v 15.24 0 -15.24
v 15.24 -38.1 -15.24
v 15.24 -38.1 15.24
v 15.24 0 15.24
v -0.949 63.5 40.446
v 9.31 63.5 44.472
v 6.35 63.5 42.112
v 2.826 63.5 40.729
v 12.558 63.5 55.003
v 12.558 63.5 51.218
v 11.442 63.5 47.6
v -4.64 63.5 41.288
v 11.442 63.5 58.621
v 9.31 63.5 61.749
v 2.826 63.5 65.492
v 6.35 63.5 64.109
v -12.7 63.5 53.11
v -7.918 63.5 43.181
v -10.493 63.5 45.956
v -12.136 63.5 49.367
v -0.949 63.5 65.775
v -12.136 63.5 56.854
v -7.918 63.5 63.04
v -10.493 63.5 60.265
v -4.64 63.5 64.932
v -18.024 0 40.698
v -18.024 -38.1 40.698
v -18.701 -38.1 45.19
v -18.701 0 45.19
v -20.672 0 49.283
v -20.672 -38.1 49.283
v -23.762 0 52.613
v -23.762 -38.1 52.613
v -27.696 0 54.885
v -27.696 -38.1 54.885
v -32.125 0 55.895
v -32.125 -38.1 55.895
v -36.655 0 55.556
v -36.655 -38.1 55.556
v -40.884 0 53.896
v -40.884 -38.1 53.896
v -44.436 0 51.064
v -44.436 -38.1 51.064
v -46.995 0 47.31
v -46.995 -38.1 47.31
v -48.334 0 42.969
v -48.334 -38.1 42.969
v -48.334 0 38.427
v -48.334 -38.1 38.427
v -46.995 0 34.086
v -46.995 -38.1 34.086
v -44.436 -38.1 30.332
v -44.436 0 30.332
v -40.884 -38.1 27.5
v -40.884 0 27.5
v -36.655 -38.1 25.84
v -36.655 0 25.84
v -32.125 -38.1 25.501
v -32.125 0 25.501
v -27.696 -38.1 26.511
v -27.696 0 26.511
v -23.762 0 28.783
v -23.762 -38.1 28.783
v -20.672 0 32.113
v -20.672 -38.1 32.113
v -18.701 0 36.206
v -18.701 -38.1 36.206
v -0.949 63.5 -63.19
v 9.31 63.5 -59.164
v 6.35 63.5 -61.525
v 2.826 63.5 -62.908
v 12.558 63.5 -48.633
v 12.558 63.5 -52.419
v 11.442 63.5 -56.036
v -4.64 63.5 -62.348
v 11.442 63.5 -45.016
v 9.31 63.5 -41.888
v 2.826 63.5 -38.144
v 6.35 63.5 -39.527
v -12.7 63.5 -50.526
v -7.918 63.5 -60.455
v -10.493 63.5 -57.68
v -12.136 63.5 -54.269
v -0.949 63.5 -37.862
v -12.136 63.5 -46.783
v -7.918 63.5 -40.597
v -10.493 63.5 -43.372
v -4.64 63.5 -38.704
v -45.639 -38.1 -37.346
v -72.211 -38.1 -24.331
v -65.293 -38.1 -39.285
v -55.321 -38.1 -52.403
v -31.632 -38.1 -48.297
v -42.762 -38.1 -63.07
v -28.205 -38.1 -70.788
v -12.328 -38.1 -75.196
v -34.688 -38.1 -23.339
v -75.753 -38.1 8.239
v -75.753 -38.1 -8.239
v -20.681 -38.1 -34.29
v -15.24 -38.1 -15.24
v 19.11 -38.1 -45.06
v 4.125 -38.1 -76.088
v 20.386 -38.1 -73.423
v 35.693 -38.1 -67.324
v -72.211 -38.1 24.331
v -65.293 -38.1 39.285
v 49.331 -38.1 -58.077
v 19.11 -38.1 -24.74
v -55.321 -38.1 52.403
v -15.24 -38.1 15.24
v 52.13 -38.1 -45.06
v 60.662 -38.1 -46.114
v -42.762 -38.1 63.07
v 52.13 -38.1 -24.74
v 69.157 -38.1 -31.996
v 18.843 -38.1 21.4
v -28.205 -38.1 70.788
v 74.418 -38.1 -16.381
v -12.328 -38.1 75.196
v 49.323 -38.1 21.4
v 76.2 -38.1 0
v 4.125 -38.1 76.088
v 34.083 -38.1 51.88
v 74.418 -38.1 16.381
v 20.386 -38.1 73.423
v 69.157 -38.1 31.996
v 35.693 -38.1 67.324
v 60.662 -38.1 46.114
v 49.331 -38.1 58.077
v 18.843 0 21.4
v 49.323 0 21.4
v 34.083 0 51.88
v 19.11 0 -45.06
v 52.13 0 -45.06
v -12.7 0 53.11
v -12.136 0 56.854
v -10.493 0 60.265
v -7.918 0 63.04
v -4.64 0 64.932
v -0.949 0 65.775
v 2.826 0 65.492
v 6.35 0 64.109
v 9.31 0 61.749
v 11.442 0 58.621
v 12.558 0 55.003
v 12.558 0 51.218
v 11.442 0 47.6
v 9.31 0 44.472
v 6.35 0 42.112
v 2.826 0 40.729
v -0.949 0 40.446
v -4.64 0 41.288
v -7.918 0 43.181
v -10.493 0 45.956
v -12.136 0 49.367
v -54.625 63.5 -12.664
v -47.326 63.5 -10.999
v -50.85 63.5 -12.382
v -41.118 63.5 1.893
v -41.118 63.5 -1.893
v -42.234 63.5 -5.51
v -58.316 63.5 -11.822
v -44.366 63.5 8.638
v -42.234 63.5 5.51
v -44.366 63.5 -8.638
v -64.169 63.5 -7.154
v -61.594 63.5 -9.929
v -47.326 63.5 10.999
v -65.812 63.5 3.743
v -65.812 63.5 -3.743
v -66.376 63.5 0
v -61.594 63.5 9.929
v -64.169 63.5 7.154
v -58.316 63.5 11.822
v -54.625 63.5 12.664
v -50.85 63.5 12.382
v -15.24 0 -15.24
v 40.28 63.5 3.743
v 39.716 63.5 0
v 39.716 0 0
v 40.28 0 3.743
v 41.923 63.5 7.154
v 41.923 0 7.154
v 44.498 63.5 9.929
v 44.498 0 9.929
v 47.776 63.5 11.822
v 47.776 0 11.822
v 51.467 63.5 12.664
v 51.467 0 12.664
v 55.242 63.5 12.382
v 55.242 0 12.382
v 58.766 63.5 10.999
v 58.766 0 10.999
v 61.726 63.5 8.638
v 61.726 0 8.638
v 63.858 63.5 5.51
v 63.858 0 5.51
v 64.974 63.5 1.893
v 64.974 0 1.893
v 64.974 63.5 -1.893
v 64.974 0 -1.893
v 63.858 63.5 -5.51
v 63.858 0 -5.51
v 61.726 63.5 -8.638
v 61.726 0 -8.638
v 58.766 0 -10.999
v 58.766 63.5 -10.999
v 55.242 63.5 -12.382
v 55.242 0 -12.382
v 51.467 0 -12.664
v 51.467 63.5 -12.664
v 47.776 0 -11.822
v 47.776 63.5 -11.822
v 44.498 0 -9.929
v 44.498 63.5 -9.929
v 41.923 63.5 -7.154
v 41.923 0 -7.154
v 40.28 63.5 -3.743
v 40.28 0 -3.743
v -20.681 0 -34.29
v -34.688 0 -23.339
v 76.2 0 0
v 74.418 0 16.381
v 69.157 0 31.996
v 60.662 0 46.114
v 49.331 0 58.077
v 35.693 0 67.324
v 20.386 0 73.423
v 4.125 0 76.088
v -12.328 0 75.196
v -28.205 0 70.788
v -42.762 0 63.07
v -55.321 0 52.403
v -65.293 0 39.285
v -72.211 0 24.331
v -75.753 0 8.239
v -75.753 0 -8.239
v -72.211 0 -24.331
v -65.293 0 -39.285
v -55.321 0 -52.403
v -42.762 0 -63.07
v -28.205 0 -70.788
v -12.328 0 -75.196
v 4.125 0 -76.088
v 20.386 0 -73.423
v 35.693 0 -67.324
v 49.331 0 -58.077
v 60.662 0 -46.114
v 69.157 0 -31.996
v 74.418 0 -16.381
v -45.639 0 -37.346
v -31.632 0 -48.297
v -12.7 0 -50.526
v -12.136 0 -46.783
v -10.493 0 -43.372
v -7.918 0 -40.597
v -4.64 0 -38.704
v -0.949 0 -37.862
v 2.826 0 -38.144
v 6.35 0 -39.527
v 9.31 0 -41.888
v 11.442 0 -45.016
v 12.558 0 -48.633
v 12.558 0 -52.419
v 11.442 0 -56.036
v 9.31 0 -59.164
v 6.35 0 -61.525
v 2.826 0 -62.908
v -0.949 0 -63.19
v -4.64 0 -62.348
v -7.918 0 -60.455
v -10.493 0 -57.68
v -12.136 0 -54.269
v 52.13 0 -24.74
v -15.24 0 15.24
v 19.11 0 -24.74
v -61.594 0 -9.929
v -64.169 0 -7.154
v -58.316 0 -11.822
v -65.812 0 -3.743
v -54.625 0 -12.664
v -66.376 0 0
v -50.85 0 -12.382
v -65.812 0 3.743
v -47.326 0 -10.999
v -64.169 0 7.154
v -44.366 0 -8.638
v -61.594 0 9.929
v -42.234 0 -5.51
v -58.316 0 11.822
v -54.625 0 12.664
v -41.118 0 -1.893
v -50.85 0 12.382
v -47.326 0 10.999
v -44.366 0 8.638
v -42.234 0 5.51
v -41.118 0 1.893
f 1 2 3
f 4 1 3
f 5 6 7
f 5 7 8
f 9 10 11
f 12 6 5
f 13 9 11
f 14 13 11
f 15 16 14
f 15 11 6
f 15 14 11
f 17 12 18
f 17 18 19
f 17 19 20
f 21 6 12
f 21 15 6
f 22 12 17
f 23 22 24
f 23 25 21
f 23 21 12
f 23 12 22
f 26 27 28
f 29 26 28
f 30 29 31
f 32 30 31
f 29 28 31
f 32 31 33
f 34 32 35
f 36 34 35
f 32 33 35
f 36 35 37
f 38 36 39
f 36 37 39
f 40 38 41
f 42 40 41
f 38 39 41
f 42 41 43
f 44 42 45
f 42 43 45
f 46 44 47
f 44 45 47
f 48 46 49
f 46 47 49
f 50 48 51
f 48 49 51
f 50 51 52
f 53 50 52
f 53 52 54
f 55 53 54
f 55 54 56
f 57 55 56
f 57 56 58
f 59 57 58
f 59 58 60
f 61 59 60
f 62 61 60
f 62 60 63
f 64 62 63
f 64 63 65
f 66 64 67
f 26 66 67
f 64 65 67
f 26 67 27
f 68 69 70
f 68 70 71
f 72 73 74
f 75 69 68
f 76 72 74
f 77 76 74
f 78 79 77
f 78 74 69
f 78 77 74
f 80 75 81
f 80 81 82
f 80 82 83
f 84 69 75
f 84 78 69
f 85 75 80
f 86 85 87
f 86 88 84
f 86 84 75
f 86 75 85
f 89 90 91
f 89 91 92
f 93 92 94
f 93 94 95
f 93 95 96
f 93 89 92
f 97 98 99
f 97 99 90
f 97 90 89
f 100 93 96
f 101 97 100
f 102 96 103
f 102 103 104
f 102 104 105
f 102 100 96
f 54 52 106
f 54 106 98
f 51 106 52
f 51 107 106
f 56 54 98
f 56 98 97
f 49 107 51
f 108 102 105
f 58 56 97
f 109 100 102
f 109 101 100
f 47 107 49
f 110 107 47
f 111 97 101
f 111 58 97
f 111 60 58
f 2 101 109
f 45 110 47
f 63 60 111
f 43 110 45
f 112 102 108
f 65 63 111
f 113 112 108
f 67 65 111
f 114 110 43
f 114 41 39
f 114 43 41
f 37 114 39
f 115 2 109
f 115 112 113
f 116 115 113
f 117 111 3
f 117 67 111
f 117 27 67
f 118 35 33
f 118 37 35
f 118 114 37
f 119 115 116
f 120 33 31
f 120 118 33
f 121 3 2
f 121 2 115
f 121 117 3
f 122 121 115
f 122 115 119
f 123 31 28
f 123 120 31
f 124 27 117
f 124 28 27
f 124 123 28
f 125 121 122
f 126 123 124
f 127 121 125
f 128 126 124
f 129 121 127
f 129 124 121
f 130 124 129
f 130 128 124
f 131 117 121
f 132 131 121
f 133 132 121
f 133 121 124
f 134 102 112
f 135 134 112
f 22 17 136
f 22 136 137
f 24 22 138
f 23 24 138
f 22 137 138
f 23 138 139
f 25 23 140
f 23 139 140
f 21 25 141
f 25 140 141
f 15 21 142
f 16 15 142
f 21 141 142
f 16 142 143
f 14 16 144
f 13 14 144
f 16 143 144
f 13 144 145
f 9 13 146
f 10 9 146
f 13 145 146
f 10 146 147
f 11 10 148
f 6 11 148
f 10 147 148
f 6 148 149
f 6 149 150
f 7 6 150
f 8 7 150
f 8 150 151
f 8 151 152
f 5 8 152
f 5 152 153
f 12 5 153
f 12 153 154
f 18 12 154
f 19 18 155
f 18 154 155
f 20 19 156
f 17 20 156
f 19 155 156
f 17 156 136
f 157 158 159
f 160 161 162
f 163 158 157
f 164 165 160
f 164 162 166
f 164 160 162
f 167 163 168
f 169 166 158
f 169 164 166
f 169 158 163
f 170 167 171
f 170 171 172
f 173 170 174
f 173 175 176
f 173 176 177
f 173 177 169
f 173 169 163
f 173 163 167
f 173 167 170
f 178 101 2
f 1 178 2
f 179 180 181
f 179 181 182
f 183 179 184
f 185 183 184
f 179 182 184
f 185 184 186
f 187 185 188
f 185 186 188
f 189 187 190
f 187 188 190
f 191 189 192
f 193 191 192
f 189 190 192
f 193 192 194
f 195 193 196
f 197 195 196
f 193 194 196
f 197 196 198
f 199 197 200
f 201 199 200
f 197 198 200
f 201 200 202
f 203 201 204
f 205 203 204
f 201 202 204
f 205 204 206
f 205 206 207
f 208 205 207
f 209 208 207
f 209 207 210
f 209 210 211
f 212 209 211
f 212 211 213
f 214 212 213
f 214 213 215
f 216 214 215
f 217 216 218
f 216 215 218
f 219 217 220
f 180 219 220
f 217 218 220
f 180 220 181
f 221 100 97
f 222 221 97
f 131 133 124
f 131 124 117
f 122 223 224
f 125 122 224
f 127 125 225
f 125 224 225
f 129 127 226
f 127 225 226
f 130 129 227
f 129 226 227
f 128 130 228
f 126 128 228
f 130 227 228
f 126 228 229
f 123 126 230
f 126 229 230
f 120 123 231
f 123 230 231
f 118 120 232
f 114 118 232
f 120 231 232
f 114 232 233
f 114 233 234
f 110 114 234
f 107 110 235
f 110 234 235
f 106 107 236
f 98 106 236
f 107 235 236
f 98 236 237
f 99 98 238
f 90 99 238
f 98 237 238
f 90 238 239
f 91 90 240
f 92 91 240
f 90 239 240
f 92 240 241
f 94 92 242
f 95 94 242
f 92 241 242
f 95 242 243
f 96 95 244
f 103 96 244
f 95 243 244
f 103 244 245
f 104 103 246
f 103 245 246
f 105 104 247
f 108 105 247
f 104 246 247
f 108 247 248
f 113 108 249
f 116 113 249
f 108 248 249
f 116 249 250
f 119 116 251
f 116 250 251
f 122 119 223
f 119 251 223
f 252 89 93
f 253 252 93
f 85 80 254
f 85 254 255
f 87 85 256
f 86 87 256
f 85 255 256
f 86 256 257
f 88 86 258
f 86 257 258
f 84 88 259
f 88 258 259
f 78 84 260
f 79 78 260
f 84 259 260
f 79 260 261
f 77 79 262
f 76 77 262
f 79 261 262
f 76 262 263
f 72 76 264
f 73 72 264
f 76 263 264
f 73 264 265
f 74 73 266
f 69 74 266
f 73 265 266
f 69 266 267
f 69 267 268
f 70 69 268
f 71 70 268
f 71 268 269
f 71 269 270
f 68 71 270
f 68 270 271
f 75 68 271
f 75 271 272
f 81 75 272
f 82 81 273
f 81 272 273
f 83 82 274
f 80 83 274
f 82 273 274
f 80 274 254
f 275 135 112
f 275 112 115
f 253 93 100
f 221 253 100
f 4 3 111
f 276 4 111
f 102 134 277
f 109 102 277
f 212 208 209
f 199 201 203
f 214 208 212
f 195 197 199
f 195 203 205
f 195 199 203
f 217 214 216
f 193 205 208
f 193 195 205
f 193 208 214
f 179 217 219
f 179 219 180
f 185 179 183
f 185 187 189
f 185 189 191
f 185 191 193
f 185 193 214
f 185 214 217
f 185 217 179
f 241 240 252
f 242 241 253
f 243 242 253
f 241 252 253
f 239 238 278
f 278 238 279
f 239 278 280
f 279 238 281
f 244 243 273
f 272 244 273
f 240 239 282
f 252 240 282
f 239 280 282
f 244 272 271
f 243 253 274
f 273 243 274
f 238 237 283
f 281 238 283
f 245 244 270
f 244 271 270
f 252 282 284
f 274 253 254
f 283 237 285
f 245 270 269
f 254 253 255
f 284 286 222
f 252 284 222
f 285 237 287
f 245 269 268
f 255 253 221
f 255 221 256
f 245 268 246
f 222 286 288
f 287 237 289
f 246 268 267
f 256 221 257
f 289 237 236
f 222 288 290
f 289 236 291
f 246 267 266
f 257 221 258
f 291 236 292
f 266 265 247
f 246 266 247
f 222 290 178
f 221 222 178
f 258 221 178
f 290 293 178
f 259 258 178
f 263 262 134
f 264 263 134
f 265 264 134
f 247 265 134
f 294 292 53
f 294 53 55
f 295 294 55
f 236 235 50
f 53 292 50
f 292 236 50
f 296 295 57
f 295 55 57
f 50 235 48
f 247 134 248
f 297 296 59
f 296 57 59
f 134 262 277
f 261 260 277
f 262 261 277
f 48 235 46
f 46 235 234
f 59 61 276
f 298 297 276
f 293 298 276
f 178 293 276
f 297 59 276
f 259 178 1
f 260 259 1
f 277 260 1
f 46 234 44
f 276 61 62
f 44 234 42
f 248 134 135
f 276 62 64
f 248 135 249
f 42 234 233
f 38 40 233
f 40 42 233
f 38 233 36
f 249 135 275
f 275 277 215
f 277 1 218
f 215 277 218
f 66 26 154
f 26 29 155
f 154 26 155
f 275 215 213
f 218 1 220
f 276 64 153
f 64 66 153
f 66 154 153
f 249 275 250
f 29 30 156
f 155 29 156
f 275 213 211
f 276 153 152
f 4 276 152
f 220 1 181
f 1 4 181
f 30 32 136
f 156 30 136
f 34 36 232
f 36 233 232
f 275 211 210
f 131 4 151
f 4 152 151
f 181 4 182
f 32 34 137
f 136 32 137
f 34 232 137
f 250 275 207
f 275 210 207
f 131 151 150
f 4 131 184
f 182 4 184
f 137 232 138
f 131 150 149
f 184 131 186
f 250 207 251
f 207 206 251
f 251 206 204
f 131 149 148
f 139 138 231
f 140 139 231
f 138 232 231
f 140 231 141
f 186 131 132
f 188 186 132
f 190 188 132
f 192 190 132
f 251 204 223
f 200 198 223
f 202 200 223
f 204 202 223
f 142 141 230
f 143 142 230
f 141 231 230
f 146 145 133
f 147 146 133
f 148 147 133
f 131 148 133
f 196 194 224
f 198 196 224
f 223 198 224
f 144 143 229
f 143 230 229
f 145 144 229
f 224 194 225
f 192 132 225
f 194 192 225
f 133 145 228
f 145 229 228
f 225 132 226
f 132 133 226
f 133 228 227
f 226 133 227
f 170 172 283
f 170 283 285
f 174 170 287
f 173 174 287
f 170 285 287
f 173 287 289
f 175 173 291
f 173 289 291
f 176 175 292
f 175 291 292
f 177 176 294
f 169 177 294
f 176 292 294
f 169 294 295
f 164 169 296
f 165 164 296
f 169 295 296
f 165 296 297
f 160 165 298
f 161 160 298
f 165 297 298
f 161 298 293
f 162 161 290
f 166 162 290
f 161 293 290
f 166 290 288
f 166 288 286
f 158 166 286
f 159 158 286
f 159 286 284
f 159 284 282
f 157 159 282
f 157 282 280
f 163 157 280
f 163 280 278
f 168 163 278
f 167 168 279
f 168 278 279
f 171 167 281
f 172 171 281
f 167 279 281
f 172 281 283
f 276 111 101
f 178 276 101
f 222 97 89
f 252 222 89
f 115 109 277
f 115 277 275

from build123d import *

# Parameters (mm, degrees)
F0_R      = 76.2
F1_DEPTH  = 38.1
F3_R      = 15.24
F4_DEPTH  = 38.1
F5_DEPTH  = 50.8
F7_DEPTH  = 38.1
F8_R      = 12.7
F9_DEPTH  = 63.5
F10_W     = 33.02
F10_H     = 20.32
F11_DEPTH = 50.8
F13_DEPTH = 38.1
F14_DEPTH = 38.1
F15_DEPTH = 38.1


with BuildPart() as f1:
    # F0 (on Front) → F1 (new body)
    with BuildSketch(Plane.XZ):
        Circle(F0_R)
    extrude(amount=F1_DEPTH)

    # F3 (on face) → F4 (cut)
    with BuildSketch(Plane.XZ.offset(38.1)):
        with Locations((-33.264, 40.697999)):
            Circle(F3_R)
    extrude(amount=-F4_DEPTH, mode=Mode.SUBTRACT)

    # F2 (on face) → F5 (cut)
    with BuildSketch(Plane.XZ.offset(38.1)):
        Polygon((34.082881, 51.879571), (18.842881, 21.399571), (49.322881, 21.399571), align=None)
    extrude(amount=-F5_DEPTH, mode=Mode.SUBTRACT)

    # F6 (on face) → F7 (cut)
    with BuildSketch(Plane.XZ.offset(38.1)):
        Polygon((15.24, 15.24), (0, 15.24), (-15.24, 15.24), (-15.24, -15.24), (0, -15.24), (15.24, -15.24), align=None)
    extrude(amount=-F7_DEPTH, mode=Mode.SUBTRACT)

    # F8 (on face) → F9 (join)
    with BuildSketch(Plane(origin=(0, 0, 0), x_dir=(-1, 0, 0), z_dir=(0, 1, 0))):
        with Locations((0, 53.110374)):
            Circle(F8_R)
        with Locations((0, -50.526001)):
            Circle(F8_R)
        with Locations((53.675998, 0)):
            Circle(F8_R)
        with Locations((-52.416001, 0)):
            Circle(F8_R)
    extrude(amount=F9_DEPTH)

    # F10 (on face) → F11 (cut)
    with BuildSketch(Plane.XZ.offset(38.1)):
        with Locations((35.620325, -34.899539)):
            Rectangle(F10_W, F10_H)
    extrude(amount=-F11_DEPTH, mode=Mode.SUBTRACT)

    # F12 (on face) → F13 (cut)
    with BuildSketch(Plane.XZ.offset(38.1)):
        Polygon((-20.681122, -34.290014), (-34.688334, -23.338923), (-45.639425, -37.346136), (-31.632213, -48.297227), align=None)
    extrude(amount=F13_DEPTH, mode=Mode.SUBTRACT)

    # F12 (on face) → F14 (cut)
    with BuildSketch(Plane.XZ.offset(38.1)):
        Polygon((-20.681122, -34.290014), (-34.688334, -23.338923), (-45.639425, -37.346136), (-31.632213, -48.297227), align=None)
    extrude(amount=-F14_DEPTH, mode=Mode.SUBTRACT)

    # F12 (on face) → F15 (cut)
    with BuildSketch(Plane.XZ.offset(38.1)):
        Polygon((-20.681122, -34.290014), (-34.688334, -23.338923), (-45.639425, -37.346136), (-31.632213, -48.297227), align=None)
    extrude(amount=-F15_DEPTH, mode=Mode.SUBTRACT)


solid = f1.part
